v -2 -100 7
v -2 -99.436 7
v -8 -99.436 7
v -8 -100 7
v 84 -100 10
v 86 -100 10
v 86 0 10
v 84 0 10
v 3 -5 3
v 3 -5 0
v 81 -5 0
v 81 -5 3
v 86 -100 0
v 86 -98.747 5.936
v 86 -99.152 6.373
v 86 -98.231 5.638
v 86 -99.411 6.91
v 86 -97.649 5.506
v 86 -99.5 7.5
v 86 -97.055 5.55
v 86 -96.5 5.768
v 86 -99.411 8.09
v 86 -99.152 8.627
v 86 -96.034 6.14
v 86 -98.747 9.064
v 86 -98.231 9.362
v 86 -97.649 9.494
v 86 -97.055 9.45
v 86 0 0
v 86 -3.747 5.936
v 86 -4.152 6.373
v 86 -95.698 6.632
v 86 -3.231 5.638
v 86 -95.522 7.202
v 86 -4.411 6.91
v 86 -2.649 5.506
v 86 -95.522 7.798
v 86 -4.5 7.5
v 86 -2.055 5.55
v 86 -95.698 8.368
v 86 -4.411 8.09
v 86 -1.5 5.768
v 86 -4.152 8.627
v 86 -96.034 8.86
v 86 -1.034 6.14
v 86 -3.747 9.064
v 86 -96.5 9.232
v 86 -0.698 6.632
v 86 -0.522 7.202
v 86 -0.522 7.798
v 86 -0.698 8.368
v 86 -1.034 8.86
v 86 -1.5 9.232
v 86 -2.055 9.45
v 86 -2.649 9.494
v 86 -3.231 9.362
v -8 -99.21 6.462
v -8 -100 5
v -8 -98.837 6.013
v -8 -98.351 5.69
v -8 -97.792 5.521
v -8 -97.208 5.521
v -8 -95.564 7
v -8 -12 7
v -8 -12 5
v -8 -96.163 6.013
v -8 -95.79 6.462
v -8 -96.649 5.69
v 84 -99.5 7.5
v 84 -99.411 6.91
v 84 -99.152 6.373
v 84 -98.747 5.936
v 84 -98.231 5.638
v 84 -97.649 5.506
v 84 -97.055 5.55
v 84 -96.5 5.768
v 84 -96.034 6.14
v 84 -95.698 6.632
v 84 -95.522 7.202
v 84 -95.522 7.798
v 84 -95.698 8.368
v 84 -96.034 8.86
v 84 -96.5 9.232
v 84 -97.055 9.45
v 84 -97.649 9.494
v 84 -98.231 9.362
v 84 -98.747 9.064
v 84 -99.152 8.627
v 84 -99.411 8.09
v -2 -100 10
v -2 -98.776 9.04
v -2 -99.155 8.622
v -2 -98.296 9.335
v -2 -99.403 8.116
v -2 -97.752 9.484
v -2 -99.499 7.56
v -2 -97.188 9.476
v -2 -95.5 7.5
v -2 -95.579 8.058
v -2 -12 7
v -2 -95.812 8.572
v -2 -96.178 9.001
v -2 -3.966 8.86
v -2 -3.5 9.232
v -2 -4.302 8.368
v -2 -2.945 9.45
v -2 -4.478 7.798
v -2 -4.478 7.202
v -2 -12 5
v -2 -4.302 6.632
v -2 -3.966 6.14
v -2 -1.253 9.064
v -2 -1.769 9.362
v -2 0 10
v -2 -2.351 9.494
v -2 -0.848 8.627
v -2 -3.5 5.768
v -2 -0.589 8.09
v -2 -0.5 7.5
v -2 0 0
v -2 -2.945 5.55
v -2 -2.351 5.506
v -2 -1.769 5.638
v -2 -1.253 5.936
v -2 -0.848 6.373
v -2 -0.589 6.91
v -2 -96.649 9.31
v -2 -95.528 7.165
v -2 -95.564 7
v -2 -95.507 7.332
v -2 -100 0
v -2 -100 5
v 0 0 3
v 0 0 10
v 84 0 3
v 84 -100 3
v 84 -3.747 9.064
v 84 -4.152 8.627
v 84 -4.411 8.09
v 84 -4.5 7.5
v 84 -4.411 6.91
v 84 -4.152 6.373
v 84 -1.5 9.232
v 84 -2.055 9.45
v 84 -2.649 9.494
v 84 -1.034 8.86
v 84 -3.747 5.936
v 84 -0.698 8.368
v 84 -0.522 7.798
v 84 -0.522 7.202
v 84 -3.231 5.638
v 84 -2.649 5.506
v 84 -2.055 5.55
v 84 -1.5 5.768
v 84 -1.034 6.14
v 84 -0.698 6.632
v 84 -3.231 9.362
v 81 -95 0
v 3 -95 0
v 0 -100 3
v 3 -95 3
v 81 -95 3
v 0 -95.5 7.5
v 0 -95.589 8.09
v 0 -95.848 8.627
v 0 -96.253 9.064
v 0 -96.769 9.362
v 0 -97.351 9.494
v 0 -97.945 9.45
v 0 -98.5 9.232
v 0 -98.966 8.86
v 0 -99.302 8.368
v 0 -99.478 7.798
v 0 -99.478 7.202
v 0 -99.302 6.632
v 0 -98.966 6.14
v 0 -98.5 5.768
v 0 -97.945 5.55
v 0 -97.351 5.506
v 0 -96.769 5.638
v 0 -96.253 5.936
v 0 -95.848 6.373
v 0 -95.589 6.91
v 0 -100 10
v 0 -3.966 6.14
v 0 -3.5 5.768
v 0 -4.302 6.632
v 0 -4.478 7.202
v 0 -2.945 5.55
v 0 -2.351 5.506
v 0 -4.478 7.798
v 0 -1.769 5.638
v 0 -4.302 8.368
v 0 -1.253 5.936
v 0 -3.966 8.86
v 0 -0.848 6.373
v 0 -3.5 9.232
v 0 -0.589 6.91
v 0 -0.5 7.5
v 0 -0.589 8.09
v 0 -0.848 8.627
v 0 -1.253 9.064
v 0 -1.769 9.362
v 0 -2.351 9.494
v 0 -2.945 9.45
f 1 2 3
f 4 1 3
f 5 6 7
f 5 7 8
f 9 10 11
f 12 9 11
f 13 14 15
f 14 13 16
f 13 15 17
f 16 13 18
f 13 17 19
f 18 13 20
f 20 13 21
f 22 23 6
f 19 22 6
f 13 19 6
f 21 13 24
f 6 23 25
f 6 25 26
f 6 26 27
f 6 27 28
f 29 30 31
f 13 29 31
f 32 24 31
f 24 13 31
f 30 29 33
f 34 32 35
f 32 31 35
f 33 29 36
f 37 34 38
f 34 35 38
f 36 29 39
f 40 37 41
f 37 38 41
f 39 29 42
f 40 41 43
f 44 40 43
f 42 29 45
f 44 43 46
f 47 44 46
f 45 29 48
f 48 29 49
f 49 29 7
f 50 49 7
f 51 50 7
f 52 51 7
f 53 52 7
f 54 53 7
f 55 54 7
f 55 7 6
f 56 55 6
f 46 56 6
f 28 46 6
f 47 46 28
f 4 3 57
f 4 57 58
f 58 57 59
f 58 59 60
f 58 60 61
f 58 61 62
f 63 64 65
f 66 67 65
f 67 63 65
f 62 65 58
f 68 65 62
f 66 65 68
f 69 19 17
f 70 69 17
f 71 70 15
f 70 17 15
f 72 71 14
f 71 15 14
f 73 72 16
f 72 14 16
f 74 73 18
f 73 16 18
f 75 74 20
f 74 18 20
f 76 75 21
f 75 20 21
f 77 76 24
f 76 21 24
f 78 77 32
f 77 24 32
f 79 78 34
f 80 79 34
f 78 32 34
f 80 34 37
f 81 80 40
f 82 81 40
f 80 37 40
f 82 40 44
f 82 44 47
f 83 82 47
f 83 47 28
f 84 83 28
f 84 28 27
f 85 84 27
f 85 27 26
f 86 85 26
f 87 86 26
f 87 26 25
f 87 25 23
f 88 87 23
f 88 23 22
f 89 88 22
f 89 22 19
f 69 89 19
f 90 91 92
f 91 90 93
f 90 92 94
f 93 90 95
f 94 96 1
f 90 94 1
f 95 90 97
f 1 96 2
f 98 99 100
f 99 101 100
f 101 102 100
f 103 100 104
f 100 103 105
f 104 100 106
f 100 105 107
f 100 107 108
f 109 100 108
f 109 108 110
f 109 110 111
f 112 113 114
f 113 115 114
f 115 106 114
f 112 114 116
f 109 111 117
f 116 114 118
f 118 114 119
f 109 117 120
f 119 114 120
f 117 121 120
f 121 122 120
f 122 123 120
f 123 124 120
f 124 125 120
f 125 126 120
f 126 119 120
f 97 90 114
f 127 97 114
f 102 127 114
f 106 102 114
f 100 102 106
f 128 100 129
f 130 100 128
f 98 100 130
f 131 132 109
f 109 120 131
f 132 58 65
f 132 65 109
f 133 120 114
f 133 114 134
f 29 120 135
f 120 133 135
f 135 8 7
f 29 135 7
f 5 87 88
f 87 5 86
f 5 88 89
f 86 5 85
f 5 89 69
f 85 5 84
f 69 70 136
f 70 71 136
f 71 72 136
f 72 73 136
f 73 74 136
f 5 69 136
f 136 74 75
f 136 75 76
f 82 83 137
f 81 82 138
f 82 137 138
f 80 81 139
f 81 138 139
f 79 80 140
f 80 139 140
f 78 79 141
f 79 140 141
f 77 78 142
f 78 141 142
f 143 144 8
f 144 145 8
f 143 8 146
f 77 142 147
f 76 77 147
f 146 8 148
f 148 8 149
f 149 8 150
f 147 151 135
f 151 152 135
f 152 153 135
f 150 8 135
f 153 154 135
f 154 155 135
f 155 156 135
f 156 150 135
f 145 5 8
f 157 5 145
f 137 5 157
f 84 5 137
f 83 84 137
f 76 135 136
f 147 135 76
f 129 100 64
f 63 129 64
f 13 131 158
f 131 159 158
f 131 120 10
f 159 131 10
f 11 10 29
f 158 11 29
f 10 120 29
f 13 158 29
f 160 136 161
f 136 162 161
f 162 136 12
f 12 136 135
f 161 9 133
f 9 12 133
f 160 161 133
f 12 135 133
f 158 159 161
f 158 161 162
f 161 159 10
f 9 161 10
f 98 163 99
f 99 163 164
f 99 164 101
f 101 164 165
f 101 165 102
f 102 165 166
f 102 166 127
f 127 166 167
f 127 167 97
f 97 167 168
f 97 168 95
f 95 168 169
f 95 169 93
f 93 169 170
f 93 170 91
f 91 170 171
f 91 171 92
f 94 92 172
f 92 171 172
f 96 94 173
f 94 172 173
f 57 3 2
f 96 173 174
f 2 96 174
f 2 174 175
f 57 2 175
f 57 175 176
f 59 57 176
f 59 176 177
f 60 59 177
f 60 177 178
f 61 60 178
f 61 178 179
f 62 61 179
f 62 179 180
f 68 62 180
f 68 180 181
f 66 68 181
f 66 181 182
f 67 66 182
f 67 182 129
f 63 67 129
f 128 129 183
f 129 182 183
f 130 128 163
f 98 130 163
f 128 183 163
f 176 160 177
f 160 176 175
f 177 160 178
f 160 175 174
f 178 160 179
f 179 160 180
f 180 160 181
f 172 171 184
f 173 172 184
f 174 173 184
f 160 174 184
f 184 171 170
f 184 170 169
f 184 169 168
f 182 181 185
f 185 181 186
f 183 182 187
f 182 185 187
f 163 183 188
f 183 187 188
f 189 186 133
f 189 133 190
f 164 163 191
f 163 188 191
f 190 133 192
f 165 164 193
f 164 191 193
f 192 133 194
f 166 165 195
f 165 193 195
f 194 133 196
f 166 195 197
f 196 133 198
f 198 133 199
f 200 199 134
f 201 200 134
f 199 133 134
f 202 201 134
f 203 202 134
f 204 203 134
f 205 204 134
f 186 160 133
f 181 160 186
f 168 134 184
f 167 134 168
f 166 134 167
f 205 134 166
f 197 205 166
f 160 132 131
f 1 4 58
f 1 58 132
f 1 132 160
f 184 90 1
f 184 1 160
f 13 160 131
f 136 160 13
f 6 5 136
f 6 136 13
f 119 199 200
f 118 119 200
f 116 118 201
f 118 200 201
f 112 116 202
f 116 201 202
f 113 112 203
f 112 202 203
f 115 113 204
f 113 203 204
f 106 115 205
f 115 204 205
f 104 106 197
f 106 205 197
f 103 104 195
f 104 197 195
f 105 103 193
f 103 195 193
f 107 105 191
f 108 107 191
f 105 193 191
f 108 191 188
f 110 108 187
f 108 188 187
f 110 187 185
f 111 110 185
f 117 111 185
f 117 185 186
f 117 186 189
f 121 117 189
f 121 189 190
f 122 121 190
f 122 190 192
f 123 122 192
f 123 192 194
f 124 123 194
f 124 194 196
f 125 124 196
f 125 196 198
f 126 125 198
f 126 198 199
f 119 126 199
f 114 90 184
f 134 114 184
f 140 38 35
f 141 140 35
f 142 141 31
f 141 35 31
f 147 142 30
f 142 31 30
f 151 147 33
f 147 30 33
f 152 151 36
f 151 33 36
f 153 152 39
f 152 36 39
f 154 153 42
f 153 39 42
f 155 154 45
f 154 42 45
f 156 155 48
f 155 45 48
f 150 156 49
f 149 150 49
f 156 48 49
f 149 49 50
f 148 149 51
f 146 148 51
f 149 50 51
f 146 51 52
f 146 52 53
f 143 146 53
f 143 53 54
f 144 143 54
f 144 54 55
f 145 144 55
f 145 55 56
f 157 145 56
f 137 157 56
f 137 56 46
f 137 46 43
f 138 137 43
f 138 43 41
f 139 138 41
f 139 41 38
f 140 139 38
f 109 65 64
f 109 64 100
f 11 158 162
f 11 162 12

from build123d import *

# Parameters (mm, degrees)
F0_W      = 2
F0_H      = 3
F1_DEPTH  = 100
F2_W      = 78
F2_H      = 90
F1_FACE_W = 6
F1_FACE_H = 100
F3_DEPTH  = 3
F4_W      = 6
F4_H      = 12
F5_DEPTH  = 10
F7_D      = 4
F7_DEPTH  = 8.001
F9_D      = 4


# Not quite as in the source:
# - a feature names something its author has since deleted; it is built from what else it names


with BuildPart() as f1:
    # F0 (on Front) → F1 (new body)
    with BuildSketch(Plane.XZ):
        Polygon((-2, 0), (0, 0), (86, 0), (86, 10), (84, 10), (84, 3), (0, 3), (0, 7), (-2, 7), (-8, 7), (-8, 5), (-2, 5), align=None)
        with Locations((-1, 8.5)):
            Rectangle(F0_W, F0_H)
    extrude(amount=F1_DEPTH)

    # F2 (on Top) + F1_face (on face) → F3 (cut)
    with BuildSketch(Plane.XY):
        with Locations((42, -50)):
            Rectangle(F2_W, F2_H)
    with BuildSketch(Plane(origin=(-5, -50, 7), x_dir=(1, 0, 0), z_dir=(0, 0, 1))):
        Rectangle(F1_FACE_W, F1_FACE_H)
    extrude(amount=F3_DEPTH, mode=Mode.SUBTRACT)

    # F4 (on Top) → F5 (cut)
    with BuildSketch(Plane.XY):
        with Locations((-5, -6)):
            Rectangle(F4_W, F4_H)
    extrude(amount=F5_DEPTH, mode=Mode.SUBTRACT)

    # F7 (through all, one way)
    with BuildSketch(Plane.YZ):
        with Locations((-2.5, 7.5), (-97.5, 7.5)):
            Circle(F7_D / 2)
    extrude(amount=-F7_DEPTH, mode=Mode.SUBTRACT)

    # F9 (through all)
    with Locations(Plane(origin=(0, 0, 0), x_dir=(0, 1, 0), z_dir=(-1, 0, 0))):
        with Locations((-2.5, -7.5), (-97.5, -7.5)):
            Hole(F9_D / 2)


solid = f1.part
